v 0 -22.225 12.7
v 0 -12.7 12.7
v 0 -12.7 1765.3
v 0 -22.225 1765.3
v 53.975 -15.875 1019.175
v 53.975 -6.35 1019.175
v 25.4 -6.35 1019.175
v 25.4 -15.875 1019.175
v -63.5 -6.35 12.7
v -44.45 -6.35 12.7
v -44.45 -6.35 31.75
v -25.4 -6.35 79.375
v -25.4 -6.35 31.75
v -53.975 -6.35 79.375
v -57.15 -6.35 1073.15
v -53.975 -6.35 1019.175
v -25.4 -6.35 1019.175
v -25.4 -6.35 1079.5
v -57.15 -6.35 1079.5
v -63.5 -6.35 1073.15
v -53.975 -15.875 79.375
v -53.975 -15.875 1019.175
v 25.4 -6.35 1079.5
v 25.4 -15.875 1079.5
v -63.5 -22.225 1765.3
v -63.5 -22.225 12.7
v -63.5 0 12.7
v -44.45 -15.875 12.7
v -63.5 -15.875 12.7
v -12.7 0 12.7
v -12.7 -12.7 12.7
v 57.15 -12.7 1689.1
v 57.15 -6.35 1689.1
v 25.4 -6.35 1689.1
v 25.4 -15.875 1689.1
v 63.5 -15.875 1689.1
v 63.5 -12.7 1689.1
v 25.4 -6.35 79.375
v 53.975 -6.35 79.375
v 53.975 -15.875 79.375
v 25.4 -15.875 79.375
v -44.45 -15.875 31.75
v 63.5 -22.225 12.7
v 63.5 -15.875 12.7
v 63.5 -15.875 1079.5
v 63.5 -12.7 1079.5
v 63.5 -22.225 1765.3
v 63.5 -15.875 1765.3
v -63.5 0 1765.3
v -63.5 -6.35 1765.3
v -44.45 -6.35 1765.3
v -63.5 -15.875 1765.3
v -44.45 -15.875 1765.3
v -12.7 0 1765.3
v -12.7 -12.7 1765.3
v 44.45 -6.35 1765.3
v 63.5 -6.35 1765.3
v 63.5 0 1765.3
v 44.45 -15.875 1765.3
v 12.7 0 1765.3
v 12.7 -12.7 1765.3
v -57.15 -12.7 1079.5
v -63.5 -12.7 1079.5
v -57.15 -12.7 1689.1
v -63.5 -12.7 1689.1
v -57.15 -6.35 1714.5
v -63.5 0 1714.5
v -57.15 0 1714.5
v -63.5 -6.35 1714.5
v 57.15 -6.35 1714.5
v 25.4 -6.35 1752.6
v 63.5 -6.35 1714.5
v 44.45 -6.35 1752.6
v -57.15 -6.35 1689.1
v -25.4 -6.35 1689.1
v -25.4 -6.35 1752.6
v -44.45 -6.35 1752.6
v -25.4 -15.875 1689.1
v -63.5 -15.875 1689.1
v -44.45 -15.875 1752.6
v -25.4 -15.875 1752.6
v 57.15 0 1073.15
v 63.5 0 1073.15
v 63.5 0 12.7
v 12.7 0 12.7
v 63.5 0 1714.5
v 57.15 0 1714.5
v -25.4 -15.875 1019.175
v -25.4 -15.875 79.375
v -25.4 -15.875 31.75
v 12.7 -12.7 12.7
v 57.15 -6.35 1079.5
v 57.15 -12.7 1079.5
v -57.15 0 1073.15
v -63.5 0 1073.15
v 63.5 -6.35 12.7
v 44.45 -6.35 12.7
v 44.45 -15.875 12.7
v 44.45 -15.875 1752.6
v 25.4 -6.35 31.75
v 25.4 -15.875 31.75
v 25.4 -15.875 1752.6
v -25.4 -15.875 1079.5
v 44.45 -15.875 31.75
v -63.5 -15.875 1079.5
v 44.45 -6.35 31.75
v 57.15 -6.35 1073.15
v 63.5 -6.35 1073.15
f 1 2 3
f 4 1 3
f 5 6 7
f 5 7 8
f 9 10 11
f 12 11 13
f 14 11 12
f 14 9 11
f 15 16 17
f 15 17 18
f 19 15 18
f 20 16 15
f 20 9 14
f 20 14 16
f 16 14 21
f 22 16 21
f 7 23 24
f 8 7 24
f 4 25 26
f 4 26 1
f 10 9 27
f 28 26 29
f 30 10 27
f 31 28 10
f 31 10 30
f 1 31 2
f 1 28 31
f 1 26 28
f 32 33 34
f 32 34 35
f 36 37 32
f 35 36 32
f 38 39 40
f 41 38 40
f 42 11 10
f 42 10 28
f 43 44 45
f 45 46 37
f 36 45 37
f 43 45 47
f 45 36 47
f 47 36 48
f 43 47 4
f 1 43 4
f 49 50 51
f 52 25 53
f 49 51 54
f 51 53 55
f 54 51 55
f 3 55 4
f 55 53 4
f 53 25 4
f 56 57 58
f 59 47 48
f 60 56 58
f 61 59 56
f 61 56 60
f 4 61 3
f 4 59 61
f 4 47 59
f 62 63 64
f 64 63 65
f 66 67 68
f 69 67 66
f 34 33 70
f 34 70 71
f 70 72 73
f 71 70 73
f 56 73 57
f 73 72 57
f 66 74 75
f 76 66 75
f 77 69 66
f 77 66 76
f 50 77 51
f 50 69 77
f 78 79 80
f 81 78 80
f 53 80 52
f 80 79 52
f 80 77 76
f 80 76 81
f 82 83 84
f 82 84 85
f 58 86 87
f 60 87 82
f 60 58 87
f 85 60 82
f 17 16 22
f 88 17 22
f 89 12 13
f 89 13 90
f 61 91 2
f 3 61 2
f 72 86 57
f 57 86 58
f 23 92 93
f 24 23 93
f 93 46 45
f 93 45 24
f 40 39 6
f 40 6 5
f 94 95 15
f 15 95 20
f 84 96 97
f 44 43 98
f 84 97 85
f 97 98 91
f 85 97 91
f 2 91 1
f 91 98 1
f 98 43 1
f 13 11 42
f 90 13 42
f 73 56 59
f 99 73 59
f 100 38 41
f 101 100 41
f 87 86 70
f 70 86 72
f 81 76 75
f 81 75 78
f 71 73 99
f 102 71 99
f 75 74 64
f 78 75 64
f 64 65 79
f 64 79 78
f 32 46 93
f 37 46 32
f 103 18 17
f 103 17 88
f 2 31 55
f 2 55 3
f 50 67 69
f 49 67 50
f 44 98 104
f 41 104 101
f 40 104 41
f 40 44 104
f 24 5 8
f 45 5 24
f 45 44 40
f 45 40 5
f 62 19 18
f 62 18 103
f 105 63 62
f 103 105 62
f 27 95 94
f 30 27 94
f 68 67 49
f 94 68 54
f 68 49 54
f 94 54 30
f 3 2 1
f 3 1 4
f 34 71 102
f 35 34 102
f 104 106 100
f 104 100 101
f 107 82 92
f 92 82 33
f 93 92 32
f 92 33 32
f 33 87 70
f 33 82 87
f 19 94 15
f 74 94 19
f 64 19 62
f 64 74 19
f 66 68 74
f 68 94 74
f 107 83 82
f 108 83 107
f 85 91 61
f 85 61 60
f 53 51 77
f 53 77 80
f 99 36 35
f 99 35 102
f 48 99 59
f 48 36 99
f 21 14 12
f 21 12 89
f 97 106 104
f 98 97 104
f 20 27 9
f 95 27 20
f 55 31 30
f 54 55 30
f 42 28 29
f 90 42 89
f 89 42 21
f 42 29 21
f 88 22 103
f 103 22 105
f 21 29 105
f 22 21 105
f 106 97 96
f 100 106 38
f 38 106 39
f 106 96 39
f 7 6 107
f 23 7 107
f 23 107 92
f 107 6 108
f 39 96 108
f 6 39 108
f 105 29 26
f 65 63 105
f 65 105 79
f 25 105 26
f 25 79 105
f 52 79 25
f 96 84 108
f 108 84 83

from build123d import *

# Parameters (mm, degrees)
F0_W      = 63.5
F0_H      = 1778
F1_DEPTH  = 22.225
F2_W      = 9.525
F2_H      = 63.5
F2_H_2    = 47.625
F2_H_3    = 60.325
F3_DEPTH  = 38.1
F2_H_4    = 25.4
F2_H_5    = 31.75
F4_DEPTH  = 19.05
F5_W      = 12.7
F5_H      = 12.7
F6_DEPTH  = 1778
F7_W      = 63.5
F7_H      = 12.7
F8_DEPTH  = 22.226
F9_W      = 9.525
F9_H      = 939.8
F10_DEPTH = 9.525
F11_W     = 12.7
F11_H     = 641.35
F12_DEPTH = 6.35


with BuildPart() as f1:
    # F0 (on Front) → F1 (new body)
    with BuildSketch(Plane.XZ):
        with Locations((-31.75, 889)):
            Rectangle(F0_W, F0_H)
    extrude(amount=F1_DEPTH)

    # F2 (on face) → F3 (cut)
    with BuildSketch(Plane(origin=(-63.5, 0, 0), x_dir=(0, -1, 0), z_dir=(-1, 0, 0))):
        with Locations((11.1125, 1720.85)):
            Rectangle(F2_W, F2_H)
        with Locations((11.1125, 55.5625)):
            Rectangle(F2_W, F2_H_2)
        with Locations((11.1125, 1049.3375)):
            Rectangle(F2_W, F2_H_3)
    extrude(amount=-F3_DEPTH, mode=Mode.SUBTRACT)

    # F2 (on face) → F4 (cut)
    with BuildSketch(Plane(origin=(-63.5, 0, 0), x_dir=(0, -1, 0), z_dir=(-1, 0, 0))):
        with Locations((11.1125, 1765.3)):
            Rectangle(F2_W, F2_H_4)
        with Locations((11.1125, 15.875)):
            Rectangle(F2_W, F2_H_5)
    extrude(amount=-F4_DEPTH, mode=Mode.SUBTRACT)

    # F5 (on Top) → F6 (cut, through all)
    with BuildSketch(Plane.XY):
        with Locations((-6.35, -6.35)):
            Rectangle(F5_W, F5_H)
    extrude(amount=F6_DEPTH, mode=Mode.SUBTRACT)

    # F7 (on face) → F8 (cut, through all)
    with BuildSketch(Plane.XZ.offset(22.225)):
        with Locations((-31.75, 1771.65)):
            Rectangle(F7_W, F7_H)
        with Locations((-31.75, 6.35)):
            Rectangle(F7_W, F7_H)
    extrude(amount=-F8_DEPTH, mode=Mode.SUBTRACT)

    # F9 (on face) → F10 (cut)
    with BuildSketch(Plane(origin=(-63.5, 0, 0), x_dir=(0, -1, 0), z_dir=(-1, 0, 0))):
        with Locations((11.1125, 549.275)):
            Rectangle(F9_W, F9_H)
    extrude(amount=-F10_DEPTH, mode=Mode.SUBTRACT)

    # F11 (on face) → F12 (cut)
    with BuildSketch(Plane(origin=(-63.5, 0, 0), x_dir=(0, -1, 0), z_dir=(-1, 0, 0))):
        with Locations((6.35, 1393.825)):
            Rectangle(F11_W, F11_H)
    extrude(amount=-F12_DEPTH, mode=Mode.SUBTRACT)


with BuildPart() as f13_1:
    # F13: instance of F1
    add(f1.part.mirror(Plane.YZ))


solid = Compound([f1.part, f13_1.part])
